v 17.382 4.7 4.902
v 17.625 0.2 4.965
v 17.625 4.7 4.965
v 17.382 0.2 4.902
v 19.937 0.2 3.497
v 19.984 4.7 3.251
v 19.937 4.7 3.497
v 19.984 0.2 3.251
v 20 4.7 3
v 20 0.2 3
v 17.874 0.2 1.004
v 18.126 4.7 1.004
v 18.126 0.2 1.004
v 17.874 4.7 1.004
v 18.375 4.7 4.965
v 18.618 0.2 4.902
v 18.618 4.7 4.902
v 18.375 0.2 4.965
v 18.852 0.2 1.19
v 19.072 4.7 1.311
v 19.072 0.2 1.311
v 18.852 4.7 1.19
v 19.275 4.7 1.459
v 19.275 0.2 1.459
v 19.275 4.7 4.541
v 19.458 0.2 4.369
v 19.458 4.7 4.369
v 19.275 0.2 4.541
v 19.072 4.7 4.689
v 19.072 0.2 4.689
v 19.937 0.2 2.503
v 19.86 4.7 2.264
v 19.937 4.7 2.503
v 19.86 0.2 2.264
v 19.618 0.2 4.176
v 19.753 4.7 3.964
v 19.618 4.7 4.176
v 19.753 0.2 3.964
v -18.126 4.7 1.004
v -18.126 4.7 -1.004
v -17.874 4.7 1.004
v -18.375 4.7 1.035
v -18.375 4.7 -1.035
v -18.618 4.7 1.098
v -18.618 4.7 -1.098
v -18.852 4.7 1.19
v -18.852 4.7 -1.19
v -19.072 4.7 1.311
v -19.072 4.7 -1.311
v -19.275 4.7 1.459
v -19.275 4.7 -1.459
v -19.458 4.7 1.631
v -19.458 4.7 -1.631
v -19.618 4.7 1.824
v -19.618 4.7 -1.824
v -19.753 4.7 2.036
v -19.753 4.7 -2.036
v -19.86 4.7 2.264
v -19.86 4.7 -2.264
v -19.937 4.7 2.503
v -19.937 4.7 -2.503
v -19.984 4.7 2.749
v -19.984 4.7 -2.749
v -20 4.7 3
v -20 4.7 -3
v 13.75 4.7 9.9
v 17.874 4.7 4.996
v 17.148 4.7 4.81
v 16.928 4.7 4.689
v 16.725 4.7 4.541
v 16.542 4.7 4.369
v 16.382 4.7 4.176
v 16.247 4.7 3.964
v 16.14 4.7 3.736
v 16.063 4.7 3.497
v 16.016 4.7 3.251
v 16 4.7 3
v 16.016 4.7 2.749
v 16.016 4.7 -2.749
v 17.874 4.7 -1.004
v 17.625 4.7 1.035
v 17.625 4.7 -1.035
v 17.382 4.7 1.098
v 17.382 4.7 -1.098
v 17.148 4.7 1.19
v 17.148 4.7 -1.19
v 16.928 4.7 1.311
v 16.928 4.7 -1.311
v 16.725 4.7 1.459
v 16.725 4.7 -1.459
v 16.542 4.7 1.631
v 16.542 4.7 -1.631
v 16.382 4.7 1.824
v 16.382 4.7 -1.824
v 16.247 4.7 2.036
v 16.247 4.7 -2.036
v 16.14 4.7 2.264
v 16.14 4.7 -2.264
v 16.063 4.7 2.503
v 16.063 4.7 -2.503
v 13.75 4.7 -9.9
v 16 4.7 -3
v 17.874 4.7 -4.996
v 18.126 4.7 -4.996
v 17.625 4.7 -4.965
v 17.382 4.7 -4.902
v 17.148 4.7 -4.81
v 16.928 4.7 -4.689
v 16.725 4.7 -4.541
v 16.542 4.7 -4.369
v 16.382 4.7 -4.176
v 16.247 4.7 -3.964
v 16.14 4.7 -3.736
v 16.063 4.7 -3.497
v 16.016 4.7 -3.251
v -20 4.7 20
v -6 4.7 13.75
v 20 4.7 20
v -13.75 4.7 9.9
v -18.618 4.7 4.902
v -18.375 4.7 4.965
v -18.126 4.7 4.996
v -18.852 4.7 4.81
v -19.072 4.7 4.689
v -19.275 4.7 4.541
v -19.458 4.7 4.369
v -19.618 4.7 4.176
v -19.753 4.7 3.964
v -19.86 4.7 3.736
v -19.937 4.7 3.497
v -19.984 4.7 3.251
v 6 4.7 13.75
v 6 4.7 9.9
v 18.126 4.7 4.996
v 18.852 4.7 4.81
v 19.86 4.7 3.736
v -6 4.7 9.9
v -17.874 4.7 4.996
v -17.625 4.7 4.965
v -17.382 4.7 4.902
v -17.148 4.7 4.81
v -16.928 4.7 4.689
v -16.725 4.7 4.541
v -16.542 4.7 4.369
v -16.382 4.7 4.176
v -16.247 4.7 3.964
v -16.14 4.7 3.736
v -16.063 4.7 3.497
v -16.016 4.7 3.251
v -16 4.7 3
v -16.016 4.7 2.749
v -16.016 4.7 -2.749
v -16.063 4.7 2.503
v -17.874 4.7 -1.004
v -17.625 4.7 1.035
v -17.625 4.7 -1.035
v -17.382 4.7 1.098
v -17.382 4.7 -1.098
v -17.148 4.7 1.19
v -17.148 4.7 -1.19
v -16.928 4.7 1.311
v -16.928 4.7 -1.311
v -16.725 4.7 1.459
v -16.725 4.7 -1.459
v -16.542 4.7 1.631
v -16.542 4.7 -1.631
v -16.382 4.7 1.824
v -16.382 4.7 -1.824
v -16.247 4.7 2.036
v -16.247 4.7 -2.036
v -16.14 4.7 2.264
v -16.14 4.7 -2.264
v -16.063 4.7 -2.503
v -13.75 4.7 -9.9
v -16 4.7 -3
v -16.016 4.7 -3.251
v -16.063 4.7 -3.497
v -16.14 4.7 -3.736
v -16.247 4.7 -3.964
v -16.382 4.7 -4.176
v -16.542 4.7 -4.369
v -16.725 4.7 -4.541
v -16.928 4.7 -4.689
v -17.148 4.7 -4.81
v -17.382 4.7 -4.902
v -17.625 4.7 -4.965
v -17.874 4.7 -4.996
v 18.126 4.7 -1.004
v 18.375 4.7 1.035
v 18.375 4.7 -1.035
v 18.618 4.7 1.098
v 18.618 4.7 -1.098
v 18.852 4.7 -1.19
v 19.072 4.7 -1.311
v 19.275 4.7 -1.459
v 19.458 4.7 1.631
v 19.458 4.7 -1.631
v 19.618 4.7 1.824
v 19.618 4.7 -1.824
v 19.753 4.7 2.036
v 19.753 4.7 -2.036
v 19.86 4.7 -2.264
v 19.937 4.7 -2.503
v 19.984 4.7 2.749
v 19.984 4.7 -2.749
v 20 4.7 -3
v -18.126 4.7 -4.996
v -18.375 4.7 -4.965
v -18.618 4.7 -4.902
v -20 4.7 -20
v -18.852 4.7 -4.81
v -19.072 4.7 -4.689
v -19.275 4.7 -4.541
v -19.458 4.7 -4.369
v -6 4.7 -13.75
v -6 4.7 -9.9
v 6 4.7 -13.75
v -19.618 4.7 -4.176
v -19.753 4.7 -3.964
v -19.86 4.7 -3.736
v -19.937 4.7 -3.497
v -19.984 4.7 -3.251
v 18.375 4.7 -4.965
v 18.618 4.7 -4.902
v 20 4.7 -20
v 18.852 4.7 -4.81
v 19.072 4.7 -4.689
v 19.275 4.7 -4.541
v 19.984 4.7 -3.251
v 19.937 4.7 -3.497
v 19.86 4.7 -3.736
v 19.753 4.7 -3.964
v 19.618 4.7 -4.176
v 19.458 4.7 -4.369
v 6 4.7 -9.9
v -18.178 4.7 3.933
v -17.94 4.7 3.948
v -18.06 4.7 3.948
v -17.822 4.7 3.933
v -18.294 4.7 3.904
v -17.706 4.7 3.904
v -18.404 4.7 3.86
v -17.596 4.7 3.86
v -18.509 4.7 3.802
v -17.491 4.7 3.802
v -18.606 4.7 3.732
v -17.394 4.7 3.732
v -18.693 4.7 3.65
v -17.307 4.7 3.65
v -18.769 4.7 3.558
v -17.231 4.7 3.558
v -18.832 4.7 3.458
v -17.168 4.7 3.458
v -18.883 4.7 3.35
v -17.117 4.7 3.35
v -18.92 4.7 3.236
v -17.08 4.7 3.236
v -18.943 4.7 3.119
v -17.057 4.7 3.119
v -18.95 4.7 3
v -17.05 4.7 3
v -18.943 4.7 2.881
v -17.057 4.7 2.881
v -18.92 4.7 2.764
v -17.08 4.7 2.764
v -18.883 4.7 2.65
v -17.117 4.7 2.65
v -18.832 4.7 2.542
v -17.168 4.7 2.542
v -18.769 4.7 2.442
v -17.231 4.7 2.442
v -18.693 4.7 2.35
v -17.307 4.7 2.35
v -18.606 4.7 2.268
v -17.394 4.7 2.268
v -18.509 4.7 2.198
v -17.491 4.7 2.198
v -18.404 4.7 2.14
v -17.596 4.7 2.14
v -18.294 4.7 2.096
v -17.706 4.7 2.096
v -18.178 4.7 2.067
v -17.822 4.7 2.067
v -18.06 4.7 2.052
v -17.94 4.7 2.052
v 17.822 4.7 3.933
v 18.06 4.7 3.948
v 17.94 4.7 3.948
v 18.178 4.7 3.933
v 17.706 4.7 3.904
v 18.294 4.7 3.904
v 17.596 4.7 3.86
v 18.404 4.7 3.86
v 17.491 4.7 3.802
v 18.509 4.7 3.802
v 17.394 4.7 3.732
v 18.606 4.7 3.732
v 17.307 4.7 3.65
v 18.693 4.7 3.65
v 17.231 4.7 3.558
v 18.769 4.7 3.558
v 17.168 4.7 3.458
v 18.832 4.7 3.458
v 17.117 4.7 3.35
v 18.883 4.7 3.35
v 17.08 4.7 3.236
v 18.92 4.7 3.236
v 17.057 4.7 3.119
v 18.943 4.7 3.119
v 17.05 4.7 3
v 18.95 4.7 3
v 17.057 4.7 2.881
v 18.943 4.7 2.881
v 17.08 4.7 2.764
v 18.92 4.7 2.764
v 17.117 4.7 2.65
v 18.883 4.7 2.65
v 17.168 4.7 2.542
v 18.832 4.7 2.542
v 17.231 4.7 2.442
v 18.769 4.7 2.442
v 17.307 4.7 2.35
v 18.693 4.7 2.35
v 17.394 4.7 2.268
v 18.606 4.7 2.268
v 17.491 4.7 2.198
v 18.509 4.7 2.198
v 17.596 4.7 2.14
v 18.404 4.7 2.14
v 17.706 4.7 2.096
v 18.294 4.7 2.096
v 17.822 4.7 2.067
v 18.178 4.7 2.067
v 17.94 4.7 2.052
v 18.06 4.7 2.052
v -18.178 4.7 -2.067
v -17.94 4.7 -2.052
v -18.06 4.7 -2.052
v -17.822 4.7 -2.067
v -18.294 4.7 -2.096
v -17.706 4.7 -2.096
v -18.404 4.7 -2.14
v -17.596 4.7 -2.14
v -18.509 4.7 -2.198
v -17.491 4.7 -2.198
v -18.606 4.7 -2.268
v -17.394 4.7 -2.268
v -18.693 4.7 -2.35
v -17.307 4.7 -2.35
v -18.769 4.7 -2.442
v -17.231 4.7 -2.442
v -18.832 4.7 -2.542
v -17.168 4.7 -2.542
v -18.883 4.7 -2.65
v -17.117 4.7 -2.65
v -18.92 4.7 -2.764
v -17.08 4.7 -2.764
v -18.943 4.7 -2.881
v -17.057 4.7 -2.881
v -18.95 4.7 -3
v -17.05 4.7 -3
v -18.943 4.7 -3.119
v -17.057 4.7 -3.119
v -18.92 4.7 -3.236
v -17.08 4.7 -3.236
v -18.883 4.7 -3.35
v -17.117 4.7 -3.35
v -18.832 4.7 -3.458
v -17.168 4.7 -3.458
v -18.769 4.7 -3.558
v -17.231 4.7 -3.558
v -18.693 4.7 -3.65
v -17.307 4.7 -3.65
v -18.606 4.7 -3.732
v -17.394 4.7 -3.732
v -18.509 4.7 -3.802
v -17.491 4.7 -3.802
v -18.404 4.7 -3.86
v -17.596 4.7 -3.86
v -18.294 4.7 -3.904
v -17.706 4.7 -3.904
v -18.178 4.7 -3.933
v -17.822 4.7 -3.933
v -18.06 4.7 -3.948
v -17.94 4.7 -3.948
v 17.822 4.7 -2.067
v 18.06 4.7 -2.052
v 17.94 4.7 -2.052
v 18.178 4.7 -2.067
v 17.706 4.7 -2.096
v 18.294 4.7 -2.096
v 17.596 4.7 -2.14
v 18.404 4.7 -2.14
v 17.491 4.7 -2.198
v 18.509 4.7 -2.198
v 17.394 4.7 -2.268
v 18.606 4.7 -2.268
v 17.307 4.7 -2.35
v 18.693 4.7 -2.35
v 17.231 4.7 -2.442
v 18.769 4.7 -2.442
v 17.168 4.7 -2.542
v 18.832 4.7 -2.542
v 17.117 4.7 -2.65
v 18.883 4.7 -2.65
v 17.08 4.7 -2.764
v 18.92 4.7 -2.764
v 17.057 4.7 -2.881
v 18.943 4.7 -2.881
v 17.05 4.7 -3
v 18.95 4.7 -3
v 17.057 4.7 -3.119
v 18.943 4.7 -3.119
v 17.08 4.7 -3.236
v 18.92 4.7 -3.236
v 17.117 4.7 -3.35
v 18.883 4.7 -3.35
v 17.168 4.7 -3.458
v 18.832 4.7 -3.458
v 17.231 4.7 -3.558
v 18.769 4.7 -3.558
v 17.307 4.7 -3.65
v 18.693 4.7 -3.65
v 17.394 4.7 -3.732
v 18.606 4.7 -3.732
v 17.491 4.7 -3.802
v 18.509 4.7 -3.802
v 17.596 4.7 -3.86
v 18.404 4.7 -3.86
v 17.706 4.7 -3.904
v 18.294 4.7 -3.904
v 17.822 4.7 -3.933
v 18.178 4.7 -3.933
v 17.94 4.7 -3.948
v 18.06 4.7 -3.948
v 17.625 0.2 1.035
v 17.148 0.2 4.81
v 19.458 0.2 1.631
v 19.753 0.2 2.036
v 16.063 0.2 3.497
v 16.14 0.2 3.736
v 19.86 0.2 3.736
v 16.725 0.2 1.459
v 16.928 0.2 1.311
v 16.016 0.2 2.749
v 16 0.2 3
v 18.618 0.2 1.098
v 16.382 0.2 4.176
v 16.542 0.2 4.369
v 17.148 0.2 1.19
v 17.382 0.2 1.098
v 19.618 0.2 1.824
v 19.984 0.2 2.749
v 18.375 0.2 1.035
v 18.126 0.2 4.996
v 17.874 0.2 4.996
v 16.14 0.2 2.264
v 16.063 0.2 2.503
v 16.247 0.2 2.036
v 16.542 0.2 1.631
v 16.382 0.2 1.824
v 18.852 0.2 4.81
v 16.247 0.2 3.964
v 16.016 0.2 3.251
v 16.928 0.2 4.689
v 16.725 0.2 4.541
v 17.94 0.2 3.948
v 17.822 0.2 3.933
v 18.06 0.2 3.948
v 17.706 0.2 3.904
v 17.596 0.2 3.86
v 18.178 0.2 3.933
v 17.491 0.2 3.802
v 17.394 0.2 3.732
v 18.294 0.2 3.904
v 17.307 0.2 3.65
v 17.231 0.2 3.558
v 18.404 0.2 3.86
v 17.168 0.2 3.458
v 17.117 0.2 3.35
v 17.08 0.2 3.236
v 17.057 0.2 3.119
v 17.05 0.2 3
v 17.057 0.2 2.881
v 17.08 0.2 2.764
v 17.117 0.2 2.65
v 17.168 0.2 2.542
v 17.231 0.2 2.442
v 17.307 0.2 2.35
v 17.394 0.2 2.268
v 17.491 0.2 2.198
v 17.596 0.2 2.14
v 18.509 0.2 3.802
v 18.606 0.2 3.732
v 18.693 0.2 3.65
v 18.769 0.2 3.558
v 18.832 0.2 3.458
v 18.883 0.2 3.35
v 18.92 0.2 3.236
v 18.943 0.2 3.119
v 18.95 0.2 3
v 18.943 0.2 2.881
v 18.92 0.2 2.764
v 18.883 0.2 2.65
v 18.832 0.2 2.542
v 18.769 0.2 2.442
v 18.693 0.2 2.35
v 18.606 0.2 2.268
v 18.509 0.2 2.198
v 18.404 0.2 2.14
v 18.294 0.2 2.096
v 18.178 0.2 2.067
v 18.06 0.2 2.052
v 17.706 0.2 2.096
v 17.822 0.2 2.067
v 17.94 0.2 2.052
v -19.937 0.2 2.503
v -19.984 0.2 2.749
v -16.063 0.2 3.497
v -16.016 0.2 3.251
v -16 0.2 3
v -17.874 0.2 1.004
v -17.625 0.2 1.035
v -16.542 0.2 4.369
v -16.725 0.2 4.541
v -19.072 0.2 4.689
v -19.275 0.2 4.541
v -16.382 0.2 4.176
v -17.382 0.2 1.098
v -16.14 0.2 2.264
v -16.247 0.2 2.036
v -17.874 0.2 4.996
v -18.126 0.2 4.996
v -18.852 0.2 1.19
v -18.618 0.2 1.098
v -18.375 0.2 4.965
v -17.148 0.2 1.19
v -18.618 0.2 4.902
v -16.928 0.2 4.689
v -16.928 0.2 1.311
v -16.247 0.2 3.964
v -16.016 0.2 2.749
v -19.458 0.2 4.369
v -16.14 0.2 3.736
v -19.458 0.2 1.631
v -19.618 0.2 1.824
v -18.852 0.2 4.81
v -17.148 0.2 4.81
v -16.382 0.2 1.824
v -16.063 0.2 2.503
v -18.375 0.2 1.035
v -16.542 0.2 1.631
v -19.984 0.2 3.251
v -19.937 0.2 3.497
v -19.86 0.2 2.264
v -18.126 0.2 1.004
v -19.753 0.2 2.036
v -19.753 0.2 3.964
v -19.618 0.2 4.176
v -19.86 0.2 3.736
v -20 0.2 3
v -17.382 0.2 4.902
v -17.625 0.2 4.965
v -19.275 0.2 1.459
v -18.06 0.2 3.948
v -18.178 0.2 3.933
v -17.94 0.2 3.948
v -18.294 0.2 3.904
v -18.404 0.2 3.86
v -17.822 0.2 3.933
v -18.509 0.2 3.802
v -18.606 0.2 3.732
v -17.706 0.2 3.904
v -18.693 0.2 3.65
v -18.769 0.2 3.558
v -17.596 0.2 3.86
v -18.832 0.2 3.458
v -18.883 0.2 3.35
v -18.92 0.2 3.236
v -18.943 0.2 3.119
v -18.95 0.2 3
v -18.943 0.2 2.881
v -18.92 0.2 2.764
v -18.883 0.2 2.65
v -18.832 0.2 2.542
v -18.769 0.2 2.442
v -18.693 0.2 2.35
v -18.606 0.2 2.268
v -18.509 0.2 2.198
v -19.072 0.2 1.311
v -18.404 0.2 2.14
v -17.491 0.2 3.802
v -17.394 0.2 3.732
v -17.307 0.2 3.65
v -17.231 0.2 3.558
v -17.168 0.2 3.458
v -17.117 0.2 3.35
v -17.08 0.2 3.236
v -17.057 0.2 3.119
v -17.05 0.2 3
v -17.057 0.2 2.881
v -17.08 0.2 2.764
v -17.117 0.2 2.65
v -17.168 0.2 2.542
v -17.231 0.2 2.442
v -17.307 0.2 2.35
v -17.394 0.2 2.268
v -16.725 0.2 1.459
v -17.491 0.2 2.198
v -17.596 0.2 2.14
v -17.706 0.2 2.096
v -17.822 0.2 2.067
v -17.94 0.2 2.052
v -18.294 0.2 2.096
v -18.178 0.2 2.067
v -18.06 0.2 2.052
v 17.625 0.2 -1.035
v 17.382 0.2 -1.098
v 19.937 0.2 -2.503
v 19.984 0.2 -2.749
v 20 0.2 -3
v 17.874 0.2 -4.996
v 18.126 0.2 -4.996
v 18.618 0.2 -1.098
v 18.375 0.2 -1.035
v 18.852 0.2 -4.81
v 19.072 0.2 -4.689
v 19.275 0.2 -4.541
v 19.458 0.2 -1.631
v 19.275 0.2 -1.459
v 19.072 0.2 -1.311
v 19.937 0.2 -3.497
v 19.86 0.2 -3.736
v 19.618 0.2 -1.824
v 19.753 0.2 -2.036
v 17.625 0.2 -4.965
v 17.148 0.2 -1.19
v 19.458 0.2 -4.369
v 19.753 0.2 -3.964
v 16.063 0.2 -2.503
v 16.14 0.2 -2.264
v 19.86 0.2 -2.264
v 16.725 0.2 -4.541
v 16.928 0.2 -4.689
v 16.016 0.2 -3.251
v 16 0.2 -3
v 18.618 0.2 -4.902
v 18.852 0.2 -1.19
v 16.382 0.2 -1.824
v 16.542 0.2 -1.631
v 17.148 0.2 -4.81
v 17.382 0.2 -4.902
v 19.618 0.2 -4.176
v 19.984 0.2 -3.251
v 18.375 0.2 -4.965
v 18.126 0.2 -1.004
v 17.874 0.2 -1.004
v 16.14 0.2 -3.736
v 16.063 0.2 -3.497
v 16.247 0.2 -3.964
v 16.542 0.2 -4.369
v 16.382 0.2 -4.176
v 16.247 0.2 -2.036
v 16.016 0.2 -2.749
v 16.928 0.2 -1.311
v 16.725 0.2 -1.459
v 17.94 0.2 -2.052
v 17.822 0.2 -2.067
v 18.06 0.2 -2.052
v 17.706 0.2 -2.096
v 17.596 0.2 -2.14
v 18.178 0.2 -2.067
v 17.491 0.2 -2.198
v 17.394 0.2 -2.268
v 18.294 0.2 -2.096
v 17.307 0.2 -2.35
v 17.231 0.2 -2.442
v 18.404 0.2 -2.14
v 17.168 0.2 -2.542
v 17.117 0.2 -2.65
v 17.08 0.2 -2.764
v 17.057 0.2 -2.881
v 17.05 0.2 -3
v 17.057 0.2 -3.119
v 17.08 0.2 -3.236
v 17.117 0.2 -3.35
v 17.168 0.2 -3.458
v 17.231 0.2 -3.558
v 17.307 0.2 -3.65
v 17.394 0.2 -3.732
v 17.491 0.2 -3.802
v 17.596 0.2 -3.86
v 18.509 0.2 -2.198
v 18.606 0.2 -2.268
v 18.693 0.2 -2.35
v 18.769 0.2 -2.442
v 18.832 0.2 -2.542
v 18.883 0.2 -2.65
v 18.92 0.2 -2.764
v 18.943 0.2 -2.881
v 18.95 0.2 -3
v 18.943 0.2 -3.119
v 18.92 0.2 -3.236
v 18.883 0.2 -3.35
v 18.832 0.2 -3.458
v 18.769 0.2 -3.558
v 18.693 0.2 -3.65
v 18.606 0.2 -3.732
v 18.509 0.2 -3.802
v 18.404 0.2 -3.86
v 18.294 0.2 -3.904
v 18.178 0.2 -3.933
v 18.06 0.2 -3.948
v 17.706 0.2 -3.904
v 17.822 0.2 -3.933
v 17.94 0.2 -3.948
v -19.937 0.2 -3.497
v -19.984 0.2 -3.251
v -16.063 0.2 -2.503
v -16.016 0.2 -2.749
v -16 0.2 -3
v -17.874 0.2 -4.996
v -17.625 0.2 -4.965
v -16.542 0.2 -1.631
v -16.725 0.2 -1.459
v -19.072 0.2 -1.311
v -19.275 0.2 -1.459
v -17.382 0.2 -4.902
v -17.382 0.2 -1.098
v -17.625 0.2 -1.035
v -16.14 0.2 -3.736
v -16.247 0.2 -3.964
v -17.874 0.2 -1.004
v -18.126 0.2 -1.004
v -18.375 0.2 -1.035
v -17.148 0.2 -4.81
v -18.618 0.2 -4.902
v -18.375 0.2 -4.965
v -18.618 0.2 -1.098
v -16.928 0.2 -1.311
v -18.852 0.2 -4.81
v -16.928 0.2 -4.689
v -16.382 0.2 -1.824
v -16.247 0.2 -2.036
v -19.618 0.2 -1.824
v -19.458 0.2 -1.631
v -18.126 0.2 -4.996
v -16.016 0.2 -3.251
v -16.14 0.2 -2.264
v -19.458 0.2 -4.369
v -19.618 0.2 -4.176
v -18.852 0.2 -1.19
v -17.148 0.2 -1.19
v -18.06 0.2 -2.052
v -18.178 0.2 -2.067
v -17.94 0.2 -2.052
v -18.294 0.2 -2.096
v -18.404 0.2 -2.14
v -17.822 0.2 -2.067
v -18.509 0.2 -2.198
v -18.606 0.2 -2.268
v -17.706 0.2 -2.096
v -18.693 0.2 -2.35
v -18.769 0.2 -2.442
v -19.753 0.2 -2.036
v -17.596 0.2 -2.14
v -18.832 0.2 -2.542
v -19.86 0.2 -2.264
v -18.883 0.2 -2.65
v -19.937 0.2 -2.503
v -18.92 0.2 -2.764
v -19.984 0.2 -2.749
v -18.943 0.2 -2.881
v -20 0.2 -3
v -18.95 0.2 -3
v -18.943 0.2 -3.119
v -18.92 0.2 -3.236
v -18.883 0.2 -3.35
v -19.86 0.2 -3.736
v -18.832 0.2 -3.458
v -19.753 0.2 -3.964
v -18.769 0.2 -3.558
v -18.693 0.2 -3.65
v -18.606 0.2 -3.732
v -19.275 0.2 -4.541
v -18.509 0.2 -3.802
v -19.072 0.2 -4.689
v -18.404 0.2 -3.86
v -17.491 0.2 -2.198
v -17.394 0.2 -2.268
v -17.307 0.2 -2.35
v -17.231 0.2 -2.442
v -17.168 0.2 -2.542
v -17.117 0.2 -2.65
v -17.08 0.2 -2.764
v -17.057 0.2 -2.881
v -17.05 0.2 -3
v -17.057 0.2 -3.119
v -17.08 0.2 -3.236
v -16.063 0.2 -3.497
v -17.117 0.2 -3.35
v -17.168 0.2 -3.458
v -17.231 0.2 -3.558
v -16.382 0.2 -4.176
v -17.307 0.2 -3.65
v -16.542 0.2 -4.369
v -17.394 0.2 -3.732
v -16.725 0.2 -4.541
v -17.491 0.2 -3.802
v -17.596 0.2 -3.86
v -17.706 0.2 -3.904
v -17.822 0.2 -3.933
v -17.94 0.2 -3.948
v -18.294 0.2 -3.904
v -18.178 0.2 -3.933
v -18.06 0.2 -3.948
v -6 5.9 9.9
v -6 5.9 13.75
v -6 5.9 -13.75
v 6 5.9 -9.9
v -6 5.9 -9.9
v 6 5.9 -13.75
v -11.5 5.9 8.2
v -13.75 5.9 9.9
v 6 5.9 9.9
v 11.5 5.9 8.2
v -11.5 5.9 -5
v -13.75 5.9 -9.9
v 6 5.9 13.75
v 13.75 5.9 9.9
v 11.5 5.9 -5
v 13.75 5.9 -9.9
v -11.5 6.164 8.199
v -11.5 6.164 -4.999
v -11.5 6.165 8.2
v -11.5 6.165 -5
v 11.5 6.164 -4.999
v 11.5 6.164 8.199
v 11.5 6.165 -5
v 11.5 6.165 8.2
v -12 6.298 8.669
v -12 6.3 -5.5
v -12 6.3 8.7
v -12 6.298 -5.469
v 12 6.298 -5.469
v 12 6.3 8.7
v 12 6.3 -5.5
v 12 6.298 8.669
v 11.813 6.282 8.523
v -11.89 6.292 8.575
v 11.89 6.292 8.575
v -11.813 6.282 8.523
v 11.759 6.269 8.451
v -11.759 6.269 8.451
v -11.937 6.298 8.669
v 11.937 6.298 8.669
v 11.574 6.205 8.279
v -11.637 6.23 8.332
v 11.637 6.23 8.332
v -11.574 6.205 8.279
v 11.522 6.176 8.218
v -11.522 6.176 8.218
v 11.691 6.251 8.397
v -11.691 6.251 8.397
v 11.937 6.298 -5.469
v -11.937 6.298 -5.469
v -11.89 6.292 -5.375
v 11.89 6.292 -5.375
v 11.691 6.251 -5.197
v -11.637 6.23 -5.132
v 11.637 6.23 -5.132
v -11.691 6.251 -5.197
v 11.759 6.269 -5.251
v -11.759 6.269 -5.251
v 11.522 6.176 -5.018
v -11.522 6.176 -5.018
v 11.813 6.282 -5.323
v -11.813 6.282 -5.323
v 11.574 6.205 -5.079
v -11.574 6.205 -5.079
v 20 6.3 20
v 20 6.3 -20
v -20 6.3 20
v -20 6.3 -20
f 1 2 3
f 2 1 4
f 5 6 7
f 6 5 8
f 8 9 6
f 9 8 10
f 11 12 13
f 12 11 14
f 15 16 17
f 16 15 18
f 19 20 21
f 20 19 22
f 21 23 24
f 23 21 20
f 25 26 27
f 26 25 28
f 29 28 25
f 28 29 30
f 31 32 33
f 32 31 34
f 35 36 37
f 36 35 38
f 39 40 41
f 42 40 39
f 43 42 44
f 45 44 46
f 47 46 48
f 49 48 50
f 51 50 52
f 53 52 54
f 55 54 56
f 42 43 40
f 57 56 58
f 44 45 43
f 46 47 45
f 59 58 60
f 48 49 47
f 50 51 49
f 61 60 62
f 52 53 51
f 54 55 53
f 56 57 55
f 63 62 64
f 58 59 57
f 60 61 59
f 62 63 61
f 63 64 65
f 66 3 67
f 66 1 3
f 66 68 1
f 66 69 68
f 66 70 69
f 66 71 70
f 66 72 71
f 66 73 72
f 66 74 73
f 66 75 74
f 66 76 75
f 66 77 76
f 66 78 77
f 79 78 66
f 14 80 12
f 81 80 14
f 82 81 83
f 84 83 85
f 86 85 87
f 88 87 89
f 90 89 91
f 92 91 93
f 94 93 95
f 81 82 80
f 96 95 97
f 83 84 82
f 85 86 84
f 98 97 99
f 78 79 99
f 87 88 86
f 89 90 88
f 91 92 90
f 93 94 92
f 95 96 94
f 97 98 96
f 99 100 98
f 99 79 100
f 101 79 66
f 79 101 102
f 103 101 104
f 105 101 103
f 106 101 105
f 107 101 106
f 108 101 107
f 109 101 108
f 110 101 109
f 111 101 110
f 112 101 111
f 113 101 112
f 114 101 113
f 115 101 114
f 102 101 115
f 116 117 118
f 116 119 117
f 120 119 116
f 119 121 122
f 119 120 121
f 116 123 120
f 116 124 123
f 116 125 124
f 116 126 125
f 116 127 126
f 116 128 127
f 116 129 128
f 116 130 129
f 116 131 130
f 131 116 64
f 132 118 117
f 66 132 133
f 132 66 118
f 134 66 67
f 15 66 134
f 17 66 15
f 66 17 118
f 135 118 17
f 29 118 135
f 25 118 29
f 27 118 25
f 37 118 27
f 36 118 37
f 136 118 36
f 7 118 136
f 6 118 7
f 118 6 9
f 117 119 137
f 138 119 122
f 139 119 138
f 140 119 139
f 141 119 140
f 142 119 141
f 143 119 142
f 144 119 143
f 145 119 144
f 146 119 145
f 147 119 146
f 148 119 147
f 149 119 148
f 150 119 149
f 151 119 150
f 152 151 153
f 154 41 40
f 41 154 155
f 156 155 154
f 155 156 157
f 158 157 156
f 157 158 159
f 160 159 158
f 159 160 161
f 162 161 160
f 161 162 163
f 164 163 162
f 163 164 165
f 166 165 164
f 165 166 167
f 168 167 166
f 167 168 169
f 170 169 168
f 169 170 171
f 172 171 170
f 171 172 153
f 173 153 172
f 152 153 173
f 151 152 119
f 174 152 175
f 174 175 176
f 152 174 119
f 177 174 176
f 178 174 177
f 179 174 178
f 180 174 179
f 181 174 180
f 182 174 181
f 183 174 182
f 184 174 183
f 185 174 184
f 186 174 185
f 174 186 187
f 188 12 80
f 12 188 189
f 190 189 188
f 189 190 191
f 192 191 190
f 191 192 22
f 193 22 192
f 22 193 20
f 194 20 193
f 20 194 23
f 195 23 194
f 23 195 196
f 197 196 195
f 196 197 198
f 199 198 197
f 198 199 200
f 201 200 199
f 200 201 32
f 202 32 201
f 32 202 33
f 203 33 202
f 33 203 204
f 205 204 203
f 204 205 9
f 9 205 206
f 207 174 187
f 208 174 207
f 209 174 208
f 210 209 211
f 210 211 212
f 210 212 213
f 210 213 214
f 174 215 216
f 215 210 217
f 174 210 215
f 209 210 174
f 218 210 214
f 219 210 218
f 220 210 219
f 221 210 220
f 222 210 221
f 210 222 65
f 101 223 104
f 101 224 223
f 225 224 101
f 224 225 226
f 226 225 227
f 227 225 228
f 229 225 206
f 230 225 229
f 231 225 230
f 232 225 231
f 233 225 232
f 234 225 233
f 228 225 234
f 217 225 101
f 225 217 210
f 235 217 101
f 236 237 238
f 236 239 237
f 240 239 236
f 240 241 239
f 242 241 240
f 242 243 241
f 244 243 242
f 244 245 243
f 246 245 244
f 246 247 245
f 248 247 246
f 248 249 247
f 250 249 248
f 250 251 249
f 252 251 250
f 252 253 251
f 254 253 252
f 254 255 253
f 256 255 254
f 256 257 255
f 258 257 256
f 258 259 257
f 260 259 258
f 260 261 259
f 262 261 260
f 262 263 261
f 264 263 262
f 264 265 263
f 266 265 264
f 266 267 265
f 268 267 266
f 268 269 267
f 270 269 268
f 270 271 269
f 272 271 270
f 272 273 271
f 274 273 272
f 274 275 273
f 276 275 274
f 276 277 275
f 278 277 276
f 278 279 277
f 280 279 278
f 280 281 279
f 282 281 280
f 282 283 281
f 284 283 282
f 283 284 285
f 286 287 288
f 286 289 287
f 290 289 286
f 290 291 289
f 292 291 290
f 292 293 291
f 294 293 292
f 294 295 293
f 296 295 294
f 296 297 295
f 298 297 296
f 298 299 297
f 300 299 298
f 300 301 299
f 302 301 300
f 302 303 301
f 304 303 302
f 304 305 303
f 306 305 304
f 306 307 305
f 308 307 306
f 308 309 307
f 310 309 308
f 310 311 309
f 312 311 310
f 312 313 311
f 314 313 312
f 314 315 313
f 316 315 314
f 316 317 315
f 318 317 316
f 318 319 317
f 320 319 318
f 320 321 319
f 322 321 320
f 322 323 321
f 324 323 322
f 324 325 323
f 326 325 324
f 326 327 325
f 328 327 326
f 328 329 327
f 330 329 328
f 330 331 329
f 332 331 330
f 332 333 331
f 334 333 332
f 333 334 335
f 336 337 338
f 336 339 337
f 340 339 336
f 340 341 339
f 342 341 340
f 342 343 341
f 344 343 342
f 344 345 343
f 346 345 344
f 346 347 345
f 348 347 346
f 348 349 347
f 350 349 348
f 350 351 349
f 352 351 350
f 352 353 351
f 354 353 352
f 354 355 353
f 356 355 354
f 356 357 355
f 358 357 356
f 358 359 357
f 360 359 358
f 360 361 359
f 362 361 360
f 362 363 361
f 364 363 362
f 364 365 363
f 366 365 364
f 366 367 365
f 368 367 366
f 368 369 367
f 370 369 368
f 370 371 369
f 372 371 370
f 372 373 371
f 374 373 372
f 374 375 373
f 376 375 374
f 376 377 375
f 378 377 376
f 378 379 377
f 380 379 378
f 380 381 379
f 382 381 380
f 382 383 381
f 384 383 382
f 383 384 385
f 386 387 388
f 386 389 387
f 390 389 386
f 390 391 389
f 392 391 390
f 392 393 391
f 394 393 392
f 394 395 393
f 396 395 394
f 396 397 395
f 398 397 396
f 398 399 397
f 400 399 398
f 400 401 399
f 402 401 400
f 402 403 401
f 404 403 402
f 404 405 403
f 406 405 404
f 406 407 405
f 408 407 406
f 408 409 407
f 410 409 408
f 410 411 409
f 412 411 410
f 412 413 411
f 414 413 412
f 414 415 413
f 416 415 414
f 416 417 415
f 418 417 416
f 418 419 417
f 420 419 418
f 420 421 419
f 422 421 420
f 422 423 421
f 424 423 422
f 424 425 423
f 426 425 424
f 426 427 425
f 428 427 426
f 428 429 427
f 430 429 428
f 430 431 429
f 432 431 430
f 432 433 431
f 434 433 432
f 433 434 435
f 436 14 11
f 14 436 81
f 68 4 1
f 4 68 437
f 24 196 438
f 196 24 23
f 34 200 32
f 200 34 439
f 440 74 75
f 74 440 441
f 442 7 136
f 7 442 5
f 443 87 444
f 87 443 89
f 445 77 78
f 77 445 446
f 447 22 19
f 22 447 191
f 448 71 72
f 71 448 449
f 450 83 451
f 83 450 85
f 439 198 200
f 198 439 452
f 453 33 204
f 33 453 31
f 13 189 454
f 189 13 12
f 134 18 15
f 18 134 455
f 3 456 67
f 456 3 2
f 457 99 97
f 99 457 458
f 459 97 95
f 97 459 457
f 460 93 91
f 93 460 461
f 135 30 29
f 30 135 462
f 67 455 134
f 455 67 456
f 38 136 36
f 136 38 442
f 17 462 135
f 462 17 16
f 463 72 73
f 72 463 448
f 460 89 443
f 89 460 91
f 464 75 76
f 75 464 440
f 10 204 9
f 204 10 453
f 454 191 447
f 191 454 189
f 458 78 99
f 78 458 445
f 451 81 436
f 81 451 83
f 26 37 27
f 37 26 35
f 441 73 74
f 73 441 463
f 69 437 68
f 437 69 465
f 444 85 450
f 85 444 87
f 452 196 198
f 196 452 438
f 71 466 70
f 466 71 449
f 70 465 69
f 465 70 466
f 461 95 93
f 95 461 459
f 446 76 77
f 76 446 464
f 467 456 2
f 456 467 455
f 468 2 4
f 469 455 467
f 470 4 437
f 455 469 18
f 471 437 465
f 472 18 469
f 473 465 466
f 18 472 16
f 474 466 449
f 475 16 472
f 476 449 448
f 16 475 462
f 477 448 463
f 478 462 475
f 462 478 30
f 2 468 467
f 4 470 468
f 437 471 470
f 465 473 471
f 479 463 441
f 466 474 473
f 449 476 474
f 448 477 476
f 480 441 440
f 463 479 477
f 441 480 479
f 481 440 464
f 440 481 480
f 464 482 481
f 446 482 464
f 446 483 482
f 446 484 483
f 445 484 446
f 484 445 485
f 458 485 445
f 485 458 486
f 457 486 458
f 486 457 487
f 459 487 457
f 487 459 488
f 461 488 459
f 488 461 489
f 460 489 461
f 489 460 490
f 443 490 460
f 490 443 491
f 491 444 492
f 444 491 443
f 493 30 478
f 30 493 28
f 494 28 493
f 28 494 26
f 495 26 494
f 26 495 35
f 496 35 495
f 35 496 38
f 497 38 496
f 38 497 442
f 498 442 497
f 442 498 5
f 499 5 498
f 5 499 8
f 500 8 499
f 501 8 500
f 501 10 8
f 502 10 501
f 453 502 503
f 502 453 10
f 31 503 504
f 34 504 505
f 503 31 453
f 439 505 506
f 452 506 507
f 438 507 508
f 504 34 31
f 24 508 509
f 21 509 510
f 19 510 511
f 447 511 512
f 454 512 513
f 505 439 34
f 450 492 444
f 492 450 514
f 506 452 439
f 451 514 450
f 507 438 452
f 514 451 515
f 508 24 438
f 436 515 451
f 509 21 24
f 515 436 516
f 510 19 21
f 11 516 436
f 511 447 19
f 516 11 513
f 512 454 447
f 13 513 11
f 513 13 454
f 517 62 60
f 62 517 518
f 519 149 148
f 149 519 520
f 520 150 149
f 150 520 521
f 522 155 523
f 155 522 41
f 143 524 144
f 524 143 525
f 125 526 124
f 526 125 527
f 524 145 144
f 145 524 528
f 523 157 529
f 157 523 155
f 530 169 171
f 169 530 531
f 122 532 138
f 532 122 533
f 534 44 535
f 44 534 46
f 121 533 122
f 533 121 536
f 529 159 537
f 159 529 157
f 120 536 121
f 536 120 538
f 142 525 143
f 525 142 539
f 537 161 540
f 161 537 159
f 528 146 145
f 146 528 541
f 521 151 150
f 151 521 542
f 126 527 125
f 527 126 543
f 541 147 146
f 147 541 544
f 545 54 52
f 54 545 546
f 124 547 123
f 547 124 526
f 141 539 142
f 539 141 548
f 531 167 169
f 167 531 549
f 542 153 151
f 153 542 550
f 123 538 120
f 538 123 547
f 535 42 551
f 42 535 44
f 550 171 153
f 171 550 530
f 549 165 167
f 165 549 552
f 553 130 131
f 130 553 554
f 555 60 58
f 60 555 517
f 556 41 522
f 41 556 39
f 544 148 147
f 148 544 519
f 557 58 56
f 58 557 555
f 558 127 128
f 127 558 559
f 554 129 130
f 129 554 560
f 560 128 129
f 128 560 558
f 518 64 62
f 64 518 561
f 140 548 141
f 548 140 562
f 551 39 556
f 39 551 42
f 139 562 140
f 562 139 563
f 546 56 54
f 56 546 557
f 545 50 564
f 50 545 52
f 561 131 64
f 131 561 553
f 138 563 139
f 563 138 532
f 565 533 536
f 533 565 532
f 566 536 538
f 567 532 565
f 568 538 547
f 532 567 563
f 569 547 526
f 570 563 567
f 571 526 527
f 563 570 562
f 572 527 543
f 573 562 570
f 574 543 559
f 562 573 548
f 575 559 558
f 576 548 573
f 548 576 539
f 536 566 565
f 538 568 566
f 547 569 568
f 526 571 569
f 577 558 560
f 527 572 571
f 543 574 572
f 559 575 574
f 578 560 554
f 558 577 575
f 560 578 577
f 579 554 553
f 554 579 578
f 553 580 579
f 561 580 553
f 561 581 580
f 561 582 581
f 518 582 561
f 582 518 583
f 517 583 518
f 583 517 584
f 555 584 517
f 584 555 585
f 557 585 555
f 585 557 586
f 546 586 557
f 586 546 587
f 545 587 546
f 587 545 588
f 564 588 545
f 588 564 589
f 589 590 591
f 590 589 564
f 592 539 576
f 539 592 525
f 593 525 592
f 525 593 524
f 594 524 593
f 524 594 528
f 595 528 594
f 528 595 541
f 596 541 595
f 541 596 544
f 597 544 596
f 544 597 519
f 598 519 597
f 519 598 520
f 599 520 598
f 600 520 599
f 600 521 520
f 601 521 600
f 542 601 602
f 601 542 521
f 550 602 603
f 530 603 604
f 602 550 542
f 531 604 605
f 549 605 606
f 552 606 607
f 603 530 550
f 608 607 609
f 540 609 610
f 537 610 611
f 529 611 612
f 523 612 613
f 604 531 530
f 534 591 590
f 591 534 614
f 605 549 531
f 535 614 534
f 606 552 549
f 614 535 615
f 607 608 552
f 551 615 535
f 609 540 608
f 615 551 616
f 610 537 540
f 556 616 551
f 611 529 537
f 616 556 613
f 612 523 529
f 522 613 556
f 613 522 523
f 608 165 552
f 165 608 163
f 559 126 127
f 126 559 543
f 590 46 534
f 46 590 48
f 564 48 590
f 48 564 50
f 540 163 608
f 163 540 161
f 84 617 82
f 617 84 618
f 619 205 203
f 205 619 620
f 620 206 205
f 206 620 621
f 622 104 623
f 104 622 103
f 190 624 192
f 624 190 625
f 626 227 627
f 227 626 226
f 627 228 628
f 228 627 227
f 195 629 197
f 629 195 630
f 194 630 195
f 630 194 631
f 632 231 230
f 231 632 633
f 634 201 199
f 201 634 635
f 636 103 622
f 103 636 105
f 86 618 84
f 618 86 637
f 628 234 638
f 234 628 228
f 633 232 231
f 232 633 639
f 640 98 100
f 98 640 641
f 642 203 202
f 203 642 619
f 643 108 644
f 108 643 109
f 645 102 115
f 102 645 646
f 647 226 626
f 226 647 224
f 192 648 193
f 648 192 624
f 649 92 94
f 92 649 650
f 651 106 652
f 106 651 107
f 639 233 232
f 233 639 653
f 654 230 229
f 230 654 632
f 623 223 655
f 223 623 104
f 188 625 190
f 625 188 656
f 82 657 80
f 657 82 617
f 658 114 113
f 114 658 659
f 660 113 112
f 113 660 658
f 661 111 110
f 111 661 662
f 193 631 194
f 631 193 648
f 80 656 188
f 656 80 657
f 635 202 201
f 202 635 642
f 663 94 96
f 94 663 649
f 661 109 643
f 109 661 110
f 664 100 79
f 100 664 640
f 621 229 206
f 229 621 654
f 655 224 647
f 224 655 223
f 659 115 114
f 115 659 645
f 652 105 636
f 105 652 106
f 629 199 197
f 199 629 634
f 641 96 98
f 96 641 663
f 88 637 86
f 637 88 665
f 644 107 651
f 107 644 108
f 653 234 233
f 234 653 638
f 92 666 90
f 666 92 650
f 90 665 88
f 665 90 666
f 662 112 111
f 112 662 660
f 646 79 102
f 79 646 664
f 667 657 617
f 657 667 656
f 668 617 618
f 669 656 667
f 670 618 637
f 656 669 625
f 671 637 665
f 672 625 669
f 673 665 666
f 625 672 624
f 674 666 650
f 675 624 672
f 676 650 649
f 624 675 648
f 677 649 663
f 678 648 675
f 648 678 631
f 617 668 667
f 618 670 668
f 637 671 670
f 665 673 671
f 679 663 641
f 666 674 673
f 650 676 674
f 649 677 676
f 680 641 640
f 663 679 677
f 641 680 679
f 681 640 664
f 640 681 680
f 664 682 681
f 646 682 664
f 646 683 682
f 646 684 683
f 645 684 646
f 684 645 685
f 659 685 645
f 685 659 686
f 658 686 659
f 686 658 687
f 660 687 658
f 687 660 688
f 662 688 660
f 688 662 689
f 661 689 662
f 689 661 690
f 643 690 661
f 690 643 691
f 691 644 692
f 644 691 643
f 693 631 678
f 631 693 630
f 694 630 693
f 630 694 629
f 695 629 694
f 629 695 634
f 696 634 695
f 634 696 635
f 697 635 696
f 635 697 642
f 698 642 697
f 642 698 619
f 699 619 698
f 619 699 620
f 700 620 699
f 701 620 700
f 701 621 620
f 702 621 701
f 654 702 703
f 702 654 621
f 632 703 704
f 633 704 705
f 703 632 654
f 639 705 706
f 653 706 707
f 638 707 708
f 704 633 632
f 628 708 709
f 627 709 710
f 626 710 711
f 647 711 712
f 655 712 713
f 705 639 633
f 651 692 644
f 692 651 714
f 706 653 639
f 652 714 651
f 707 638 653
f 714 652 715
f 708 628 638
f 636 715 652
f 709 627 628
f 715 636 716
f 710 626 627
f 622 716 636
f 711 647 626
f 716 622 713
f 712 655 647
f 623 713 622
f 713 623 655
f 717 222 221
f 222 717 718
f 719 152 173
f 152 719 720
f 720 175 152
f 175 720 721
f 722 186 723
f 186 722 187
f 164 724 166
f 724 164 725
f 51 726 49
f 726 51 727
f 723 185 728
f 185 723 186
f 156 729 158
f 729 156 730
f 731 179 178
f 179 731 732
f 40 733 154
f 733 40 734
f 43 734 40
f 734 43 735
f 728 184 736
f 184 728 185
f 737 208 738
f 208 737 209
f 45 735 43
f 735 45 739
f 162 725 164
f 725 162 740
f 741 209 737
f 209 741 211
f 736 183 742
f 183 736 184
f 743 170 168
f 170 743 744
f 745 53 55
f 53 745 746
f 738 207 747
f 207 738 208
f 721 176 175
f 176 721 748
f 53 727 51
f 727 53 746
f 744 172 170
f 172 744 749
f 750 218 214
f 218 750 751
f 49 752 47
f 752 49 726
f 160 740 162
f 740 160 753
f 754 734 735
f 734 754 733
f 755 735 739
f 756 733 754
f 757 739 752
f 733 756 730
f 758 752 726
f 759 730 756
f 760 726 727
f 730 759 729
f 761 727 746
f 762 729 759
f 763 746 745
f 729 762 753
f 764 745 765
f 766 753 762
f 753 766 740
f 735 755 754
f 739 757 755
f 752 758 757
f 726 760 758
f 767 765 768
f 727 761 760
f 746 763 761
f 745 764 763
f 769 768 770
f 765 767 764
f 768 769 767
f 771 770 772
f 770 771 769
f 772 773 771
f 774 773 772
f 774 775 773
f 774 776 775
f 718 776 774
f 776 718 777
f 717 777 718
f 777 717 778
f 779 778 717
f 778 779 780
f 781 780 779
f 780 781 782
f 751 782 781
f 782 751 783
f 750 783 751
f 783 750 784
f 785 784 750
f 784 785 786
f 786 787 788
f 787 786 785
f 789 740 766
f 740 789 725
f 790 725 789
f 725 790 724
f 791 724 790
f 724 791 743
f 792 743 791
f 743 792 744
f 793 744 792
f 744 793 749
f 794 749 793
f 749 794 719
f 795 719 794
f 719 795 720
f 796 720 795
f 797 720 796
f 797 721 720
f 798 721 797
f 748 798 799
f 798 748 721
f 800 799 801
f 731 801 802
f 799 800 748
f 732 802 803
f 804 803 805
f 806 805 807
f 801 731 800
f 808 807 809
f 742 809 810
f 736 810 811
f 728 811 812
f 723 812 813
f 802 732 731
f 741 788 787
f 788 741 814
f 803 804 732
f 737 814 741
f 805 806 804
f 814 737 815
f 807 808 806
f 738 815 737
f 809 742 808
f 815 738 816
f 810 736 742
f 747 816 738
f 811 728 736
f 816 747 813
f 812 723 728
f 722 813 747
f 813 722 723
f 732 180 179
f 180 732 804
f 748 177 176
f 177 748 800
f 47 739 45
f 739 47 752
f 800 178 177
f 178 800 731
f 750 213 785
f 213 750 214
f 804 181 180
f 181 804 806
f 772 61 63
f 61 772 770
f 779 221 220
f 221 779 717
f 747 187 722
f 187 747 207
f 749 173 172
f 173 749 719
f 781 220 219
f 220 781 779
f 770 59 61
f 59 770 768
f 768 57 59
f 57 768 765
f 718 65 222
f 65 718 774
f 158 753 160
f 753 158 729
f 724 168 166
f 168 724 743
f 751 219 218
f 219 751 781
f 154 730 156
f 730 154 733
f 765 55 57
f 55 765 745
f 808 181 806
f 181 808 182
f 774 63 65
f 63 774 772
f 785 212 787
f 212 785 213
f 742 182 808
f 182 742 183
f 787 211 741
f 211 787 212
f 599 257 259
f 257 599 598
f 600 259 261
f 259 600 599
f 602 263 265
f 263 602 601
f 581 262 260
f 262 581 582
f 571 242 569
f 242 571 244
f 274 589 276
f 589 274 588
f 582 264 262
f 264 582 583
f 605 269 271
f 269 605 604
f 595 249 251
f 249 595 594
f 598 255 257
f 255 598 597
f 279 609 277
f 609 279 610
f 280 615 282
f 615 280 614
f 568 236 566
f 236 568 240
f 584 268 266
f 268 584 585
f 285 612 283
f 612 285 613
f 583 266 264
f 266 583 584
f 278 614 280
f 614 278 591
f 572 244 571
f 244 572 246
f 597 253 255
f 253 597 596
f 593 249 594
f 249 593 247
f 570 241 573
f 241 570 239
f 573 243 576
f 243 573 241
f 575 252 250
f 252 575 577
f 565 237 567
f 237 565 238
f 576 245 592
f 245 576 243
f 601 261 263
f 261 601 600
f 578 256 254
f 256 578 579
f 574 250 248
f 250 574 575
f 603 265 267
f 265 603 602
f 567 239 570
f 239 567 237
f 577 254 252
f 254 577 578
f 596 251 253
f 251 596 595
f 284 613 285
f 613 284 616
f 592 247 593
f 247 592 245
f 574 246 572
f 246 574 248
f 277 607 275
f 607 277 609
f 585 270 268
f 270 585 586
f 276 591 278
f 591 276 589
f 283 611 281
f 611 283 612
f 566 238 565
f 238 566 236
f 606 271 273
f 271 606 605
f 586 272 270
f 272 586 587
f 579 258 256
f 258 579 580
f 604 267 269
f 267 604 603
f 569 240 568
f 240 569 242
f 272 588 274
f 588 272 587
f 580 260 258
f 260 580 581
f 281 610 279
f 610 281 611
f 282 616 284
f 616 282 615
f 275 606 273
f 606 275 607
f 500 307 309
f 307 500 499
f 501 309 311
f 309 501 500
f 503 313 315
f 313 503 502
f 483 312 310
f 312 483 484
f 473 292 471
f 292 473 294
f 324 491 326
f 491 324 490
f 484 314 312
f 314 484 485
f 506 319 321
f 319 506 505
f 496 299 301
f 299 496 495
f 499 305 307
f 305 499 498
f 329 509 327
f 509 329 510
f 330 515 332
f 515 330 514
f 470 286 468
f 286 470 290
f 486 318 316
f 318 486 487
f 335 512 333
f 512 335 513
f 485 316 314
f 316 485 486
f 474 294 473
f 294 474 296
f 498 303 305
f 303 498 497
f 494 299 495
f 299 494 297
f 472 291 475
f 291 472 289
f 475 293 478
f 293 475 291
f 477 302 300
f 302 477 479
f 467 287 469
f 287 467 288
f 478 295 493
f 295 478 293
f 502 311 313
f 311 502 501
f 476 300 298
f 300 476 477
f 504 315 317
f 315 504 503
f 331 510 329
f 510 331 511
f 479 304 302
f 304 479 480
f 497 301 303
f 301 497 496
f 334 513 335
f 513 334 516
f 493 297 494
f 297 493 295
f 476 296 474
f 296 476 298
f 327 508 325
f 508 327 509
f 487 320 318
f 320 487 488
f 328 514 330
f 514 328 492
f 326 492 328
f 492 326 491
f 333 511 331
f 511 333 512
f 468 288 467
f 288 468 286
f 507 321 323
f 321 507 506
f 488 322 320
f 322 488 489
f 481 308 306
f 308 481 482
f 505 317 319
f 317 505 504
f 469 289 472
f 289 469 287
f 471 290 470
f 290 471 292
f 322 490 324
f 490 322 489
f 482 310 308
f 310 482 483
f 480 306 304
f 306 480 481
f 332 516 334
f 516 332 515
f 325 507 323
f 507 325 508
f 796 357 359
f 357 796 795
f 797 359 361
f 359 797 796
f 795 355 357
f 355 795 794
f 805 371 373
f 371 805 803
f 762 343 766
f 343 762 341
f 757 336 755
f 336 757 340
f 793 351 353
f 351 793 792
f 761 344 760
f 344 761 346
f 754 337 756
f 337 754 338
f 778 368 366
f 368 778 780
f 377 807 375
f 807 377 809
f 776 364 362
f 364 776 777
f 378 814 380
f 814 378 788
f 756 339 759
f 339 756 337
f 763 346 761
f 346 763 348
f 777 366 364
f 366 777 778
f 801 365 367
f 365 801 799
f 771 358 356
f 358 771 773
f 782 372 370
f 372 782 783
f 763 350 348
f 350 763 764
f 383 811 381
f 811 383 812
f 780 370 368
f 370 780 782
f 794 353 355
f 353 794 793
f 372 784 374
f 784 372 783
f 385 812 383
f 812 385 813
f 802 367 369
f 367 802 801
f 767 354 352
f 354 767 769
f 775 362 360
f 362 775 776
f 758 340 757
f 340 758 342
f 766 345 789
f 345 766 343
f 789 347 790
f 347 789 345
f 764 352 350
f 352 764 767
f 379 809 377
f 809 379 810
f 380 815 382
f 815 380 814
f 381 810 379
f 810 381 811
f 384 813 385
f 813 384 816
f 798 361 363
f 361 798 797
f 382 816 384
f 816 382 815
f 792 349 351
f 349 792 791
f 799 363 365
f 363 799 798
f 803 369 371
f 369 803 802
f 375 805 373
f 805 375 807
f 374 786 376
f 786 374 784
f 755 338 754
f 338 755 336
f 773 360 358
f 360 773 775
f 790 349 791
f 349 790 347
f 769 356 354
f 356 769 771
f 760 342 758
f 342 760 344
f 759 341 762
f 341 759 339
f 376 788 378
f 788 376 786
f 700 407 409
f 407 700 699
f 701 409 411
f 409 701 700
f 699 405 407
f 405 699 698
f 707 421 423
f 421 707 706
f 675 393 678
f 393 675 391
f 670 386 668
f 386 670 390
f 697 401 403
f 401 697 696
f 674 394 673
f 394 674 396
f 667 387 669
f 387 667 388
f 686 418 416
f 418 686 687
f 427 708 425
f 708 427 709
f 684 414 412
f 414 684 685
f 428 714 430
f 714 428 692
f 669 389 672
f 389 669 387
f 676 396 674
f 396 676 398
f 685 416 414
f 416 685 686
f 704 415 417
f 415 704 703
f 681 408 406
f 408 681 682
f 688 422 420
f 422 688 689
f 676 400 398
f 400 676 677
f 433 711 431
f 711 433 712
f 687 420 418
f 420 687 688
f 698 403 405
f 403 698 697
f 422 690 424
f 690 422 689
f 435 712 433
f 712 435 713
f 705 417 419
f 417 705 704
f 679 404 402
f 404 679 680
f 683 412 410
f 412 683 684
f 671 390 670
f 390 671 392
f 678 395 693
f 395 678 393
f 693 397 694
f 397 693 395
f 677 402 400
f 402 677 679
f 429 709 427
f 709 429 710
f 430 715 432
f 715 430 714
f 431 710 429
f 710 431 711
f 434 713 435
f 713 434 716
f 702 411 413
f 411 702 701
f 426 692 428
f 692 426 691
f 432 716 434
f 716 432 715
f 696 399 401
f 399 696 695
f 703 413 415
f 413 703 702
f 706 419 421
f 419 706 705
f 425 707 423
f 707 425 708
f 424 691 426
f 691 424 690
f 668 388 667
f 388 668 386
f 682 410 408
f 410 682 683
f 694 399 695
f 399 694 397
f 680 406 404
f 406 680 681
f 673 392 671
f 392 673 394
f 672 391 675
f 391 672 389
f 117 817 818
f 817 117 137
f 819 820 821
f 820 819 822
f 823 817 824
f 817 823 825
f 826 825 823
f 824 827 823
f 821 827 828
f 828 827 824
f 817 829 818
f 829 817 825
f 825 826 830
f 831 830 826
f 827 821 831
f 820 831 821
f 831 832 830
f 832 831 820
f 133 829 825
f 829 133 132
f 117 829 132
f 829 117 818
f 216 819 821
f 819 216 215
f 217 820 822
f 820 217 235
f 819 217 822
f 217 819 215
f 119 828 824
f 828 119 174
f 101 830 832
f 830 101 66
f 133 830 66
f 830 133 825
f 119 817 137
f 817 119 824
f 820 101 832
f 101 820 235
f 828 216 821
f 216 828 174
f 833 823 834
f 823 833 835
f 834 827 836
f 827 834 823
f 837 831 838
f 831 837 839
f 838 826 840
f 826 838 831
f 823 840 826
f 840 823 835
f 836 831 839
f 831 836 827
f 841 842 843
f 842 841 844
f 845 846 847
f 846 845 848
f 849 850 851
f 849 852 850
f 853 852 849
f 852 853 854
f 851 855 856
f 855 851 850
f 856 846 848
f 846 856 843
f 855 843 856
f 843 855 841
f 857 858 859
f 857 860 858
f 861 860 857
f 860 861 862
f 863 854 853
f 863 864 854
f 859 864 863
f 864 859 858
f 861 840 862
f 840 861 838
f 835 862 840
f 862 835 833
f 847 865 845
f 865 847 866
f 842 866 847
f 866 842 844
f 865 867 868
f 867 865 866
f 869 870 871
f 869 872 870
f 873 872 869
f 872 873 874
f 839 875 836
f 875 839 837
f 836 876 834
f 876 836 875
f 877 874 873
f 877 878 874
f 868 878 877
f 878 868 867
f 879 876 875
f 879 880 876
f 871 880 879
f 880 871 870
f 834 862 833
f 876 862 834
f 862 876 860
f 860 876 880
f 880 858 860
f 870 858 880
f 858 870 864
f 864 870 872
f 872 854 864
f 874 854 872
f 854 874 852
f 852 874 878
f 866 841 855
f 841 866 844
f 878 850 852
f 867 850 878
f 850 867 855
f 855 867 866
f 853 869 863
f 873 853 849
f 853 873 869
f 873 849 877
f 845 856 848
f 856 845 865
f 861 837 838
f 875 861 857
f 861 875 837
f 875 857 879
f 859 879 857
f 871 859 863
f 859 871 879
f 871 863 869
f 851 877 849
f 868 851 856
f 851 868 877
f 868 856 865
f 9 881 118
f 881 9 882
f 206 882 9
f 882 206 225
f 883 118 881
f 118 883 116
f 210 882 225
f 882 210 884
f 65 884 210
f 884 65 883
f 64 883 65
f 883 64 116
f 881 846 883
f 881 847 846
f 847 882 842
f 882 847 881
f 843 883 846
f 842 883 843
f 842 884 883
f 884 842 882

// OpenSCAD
$fn=90;

//FrontEinschub();

DimTest();
//translate([0,3.5,0]) rotate([-90,180,0]) OLED();
//rotate([90,0,0])  translate([0,0,3]) buegel();
//rotate([90,0,0]) translate([0,0,-3]) buegel();


module buegel(){
    
   difference(){
      union(){ 
    minkowski(){
    cube([40-3.9,2,4-3.9],center=true);
    rotate([90,0,0]) cylinder(d=3.9,h=0.01);
    }
    
     translate([0,2,0]) minkowski(){
    cube([20-3.9,4,4-3.9],center=true);
    rotate([90,0,0]) cylinder(d=3.9,h=0.01);
    }
}
     translate([18,4,0]) rotate([90,0,0]) cylinder(d=1.9,h=10); //Bohrung
         translate([-18,4,0]) rotate([90,0,0]) cylinder(d=1.9,h=10);
}
}

module DimTest(){
    

 difference(){
  union(){   
translate([18,4.7,3]) rotate([90,0,0])    cylinder(d=4,h=4.5);
    translate([-18,4.7,3]) rotate([90,0,0])    cylinder(d=4,h=4.5);
      translate([18,4.7,-3]) rotate([90,0,0])    cylinder(d=4,h=4.5);
    translate([-18,4.7,-3]) rotate([90,0,0])    cylinder(d=4,h=4.5);
  }
     translate([-18,5,3]) rotate([90,0,0]) cylinder(d=1.9,h=10);
         translate([18,5,3]) rotate([90,0,0]) cylinder(d=1.9,h=10);
       translate([-18,5,-3]) rotate([90,0,0]) cylinder(d=1.9,h=10);
         translate([18,5,-3]) rotate([90,0,0]) cylinder(d=1.9,h=10);
    }
     $fn=50;  
difference(){
 translate([0,5.5,0]) cube([40,1.6,40],center=true); //Frontplatte
 translate([0,3.3,0]) rotate([-90,180,0]) OLED();
    
translate([0,5.3,1.6]) rotate([-90,180,0]) LochkantenRundung();
}
}


module FrontEinschub(){
 //Buegelhalterung OLED
   translate([8,0,0])  difference(){
   union(){   
translate([18,4.7,3]) rotate([90,0,0])    cylinder(d=4,h=4.5);
    translate([-18,4.7,3]) rotate([90,0,0])    cylinder(d=4,h=4.5);
      translate([18,4.7,-3]) rotate([90,0,0])    cylinder(d=4,h=4.5);
    translate([-18,4.7,-3]) rotate([90,0,0])    cylinder(d=4,h=4.5);
  }
     translate([-18,5,3]) rotate([90,0,0]) cylinder(d=1.9,h=10);
         translate([18,5,3]) rotate([90,0,0]) cylinder(d=1.9,h=10);
       translate([-18,5,-3]) rotate([90,0,0]) cylinder(d=1.9,h=10);
         translate([18,5,-3]) rotate([90,0,0]) cylinder(d=1.9,h=10);
    }
    
    
    
translate([0,0,0])ESP();

difference(){
    union(){

    translate([-7,5.5,0]) cube([117-20,1.6,75-10],center=true); //Frontplatte
        
        //translate([53,6.3,0]) rotate([90,0,0])cylinder(r=12,h=6.3); //Poti Ummant
         //translate([53,6.3,0]) rotate([90,0,0])cylinder(r=5,h=7.3); //Poti Ummant
        translate([-28,6.3,0]) rotate([90,0,0])cylinder(r=12,h=6.3); //Drehgeber Ummant
               translate([-28,6.3,0]) rotate([90,0,0])cylinder(r=5,h=7.3); //Drehgeber Ummant
 /*     
      translate([0,0,-0.5]){  //Lochbild Display
          difference(){
              union(){
         translate([75/2,5.3,31/2]) rotate([90,0,0])cylinder(r=2.5,h=6.1); //Schraube Display
     translate([-75/2,5.3,31/2]) rotate([90,0,0])cylinder(r=2.5,h=6.1); //Schraube Display
     translate([75/2,5.3,-(31/2)]) rotate([90,0,0])cylinder(r=2.5,h=6.1); //Schraube Display
     translate([-75/2,5.3,-(31/2)]) rotate([90,0,0])cylinder(r=2.5,h=6.1); //Schraube Display
              }
          translate([75/2,5.3,31/2]) rotate([90,0,0])cylinder(r=0.8,h=10); //Schraube Display
     translate([-75/2,5.3,31/2]) rotate([90,0,0])cylinder(r=0.8,h=10); //Schraube Display
     translate([75/2,5.3,-(31/2)]) rotate([90,0,0])cylinder(r=0.8,h=10); //Schraube Display
     translate([-75/2,5.3,-(31/2)]) rotate([90,0,0])cylinder(r=0.8,h=10); //Schraube Display
      }
    }
    */
}
translate([8,3.3,-1.6]) rotate([-90,180,0]) OLED();

//translate([53,10+1.2,0]) rotate([90,0,0])cylinder(r=11,h=10); //Poti
translate([-28,10+1.2,0]) rotate([90,0,0])cylinder(r=11,h=10); //Drehgeber
    
//translate([53,10-2,0]) rotate([90,0,0])cylinder(r=3.5,h=10); //Poti
translate([-28,10-2,0]) rotate([90,0,0])cylinder(r=3.5,h=10); //Drehgeber    
    
//translate([0,4,0]) cube([71.4,10,24.4],center=true);    //Display
    
    //translate([0,-2,0]) cube([82,10,24],center=true);    //Display Absenkung
    //translate([0,-2,0]) cube([71,10,37],center=true);    //Display Absenkung
  /*  
 
    */
}

module ESP(){  //auf Lochplatine 24x18 
    minkowski(){
    translate([0,1,45.3/2])cube([65,10-2,3-1],center=true);
        sphere(1);
    }
        minkowski(){
    translate([0,1,-45.3/2])cube([66,10-2,3-1],center=true);
        sphere(1);
    }
difference(){
union(){
 translate([65.3/2,5.3,45.3/2]) rotate([90,0,0])cylinder(r=3,h=20.3);
 translate([-65.3/2,5.3,45.3/2]) rotate([90,0,0])cylinder(r=3,h=20.3);
 translate([65.3/2,5.3,-45.3/2]) rotate([90,0,0])cylinder(r=3,h=20.3);
 translate([-65.3/2,5.3,-45.3/2]) rotate([90,0,0])cylinder(r=3,h=20.3);
}
translate([65.3/2,5.3-4,45.3/2]) rotate([90,0,0])cylinder(r=0.8,h=20.3);
 translate([-65.3/2,5.3-4,45.3/2]) rotate([90,0,0])cylinder(r=0.8,h=20.3);
 translate([65.3/2,5.3-4,-45.3/2]) rotate([90,0,0])cylinder(r=0.8,h=20.3);
 translate([-65.3/2,5.3-4,-45.3/2]) rotate([90,0,0])cylinder(r=0.8,h=20.3);
}
}
}

module OLED(){
    // OLED Display;

$fn=(80);
difference(){
union(){
  translate([2.54/2,14-1.25,-11+1.1+1.2]) cylinder(d=0.6,h=11);  //stifte
  translate([2.54/2+2.54,14-1.25,-11+1.1+1.2]) cylinder(d=0.6,h=11);  
  translate([-2.54/2,14-1.25,-11+1.1+1.2]) cylinder(d=0.6,h=11);  
  translate([-2.54/2-2.54,14-1.25,-11+1.1+1.2]) cylinder(d=0.6,h=11);  
   
   translate([0,12.5,-1.25]) cube([10,2.8,2.5],center=true); //stiftisolierung
     translate([0,11.5,0.75+1.1]) cube([12,4.5,1.5],center=true); //stifte oben
      translate([0,-11.5,0.75+1.1]) cube([12,4.5,1.5],center=true); //flexband
    
translate([0,0,0.6]) cube([28,28,1.2],center=true); //basis
    translate([0,0,1.3]) cube([27+0.5,19+0.8,2.6],center=true); //OLED
      translate([0,1.6,1.6]) cube([23,13.2,3.1],center=true); //OLED oeffnung
}
translate([23.7/2,24/2,-0.1]) cylinder(d=2,h=2); //befestigungsbohrung
translate([-23.7/2,24/2,-0.1]) cylinder(d=2,h=2);
translate([23.7/2,-24/2,-0.1]) cylinder(d=2,h=2);
translate([-23.7/2,-24/2,-0.1]) cylinder(d=2,h=2);
}
}

module LochkantenRundung(){
    L=24;
    B=14.2;
    R=1;
    
    color([1,1,1]) difference(){
    translate([0,0,5])cube([L,B,10],center=true);
    
    
   translate([-(L+R/2)/2,B/2,0]) rotate([0,90,0])cylinder(r=R,h=L+R/2);
   translate([-(L+R/2)/2,-B/2,0]) rotate([0,90,0])cylinder(r=R,h=L+R/2); 
   translate([L/2,(B+R/2)/2,0]) rotate([90,0,0])cylinder(r=R,h=B+R/2); 
   translate([-L/2,(B+R/2)/2,0]) rotate([90,0,0])cylinder(r=R,h=B+R/2); 
}
}
